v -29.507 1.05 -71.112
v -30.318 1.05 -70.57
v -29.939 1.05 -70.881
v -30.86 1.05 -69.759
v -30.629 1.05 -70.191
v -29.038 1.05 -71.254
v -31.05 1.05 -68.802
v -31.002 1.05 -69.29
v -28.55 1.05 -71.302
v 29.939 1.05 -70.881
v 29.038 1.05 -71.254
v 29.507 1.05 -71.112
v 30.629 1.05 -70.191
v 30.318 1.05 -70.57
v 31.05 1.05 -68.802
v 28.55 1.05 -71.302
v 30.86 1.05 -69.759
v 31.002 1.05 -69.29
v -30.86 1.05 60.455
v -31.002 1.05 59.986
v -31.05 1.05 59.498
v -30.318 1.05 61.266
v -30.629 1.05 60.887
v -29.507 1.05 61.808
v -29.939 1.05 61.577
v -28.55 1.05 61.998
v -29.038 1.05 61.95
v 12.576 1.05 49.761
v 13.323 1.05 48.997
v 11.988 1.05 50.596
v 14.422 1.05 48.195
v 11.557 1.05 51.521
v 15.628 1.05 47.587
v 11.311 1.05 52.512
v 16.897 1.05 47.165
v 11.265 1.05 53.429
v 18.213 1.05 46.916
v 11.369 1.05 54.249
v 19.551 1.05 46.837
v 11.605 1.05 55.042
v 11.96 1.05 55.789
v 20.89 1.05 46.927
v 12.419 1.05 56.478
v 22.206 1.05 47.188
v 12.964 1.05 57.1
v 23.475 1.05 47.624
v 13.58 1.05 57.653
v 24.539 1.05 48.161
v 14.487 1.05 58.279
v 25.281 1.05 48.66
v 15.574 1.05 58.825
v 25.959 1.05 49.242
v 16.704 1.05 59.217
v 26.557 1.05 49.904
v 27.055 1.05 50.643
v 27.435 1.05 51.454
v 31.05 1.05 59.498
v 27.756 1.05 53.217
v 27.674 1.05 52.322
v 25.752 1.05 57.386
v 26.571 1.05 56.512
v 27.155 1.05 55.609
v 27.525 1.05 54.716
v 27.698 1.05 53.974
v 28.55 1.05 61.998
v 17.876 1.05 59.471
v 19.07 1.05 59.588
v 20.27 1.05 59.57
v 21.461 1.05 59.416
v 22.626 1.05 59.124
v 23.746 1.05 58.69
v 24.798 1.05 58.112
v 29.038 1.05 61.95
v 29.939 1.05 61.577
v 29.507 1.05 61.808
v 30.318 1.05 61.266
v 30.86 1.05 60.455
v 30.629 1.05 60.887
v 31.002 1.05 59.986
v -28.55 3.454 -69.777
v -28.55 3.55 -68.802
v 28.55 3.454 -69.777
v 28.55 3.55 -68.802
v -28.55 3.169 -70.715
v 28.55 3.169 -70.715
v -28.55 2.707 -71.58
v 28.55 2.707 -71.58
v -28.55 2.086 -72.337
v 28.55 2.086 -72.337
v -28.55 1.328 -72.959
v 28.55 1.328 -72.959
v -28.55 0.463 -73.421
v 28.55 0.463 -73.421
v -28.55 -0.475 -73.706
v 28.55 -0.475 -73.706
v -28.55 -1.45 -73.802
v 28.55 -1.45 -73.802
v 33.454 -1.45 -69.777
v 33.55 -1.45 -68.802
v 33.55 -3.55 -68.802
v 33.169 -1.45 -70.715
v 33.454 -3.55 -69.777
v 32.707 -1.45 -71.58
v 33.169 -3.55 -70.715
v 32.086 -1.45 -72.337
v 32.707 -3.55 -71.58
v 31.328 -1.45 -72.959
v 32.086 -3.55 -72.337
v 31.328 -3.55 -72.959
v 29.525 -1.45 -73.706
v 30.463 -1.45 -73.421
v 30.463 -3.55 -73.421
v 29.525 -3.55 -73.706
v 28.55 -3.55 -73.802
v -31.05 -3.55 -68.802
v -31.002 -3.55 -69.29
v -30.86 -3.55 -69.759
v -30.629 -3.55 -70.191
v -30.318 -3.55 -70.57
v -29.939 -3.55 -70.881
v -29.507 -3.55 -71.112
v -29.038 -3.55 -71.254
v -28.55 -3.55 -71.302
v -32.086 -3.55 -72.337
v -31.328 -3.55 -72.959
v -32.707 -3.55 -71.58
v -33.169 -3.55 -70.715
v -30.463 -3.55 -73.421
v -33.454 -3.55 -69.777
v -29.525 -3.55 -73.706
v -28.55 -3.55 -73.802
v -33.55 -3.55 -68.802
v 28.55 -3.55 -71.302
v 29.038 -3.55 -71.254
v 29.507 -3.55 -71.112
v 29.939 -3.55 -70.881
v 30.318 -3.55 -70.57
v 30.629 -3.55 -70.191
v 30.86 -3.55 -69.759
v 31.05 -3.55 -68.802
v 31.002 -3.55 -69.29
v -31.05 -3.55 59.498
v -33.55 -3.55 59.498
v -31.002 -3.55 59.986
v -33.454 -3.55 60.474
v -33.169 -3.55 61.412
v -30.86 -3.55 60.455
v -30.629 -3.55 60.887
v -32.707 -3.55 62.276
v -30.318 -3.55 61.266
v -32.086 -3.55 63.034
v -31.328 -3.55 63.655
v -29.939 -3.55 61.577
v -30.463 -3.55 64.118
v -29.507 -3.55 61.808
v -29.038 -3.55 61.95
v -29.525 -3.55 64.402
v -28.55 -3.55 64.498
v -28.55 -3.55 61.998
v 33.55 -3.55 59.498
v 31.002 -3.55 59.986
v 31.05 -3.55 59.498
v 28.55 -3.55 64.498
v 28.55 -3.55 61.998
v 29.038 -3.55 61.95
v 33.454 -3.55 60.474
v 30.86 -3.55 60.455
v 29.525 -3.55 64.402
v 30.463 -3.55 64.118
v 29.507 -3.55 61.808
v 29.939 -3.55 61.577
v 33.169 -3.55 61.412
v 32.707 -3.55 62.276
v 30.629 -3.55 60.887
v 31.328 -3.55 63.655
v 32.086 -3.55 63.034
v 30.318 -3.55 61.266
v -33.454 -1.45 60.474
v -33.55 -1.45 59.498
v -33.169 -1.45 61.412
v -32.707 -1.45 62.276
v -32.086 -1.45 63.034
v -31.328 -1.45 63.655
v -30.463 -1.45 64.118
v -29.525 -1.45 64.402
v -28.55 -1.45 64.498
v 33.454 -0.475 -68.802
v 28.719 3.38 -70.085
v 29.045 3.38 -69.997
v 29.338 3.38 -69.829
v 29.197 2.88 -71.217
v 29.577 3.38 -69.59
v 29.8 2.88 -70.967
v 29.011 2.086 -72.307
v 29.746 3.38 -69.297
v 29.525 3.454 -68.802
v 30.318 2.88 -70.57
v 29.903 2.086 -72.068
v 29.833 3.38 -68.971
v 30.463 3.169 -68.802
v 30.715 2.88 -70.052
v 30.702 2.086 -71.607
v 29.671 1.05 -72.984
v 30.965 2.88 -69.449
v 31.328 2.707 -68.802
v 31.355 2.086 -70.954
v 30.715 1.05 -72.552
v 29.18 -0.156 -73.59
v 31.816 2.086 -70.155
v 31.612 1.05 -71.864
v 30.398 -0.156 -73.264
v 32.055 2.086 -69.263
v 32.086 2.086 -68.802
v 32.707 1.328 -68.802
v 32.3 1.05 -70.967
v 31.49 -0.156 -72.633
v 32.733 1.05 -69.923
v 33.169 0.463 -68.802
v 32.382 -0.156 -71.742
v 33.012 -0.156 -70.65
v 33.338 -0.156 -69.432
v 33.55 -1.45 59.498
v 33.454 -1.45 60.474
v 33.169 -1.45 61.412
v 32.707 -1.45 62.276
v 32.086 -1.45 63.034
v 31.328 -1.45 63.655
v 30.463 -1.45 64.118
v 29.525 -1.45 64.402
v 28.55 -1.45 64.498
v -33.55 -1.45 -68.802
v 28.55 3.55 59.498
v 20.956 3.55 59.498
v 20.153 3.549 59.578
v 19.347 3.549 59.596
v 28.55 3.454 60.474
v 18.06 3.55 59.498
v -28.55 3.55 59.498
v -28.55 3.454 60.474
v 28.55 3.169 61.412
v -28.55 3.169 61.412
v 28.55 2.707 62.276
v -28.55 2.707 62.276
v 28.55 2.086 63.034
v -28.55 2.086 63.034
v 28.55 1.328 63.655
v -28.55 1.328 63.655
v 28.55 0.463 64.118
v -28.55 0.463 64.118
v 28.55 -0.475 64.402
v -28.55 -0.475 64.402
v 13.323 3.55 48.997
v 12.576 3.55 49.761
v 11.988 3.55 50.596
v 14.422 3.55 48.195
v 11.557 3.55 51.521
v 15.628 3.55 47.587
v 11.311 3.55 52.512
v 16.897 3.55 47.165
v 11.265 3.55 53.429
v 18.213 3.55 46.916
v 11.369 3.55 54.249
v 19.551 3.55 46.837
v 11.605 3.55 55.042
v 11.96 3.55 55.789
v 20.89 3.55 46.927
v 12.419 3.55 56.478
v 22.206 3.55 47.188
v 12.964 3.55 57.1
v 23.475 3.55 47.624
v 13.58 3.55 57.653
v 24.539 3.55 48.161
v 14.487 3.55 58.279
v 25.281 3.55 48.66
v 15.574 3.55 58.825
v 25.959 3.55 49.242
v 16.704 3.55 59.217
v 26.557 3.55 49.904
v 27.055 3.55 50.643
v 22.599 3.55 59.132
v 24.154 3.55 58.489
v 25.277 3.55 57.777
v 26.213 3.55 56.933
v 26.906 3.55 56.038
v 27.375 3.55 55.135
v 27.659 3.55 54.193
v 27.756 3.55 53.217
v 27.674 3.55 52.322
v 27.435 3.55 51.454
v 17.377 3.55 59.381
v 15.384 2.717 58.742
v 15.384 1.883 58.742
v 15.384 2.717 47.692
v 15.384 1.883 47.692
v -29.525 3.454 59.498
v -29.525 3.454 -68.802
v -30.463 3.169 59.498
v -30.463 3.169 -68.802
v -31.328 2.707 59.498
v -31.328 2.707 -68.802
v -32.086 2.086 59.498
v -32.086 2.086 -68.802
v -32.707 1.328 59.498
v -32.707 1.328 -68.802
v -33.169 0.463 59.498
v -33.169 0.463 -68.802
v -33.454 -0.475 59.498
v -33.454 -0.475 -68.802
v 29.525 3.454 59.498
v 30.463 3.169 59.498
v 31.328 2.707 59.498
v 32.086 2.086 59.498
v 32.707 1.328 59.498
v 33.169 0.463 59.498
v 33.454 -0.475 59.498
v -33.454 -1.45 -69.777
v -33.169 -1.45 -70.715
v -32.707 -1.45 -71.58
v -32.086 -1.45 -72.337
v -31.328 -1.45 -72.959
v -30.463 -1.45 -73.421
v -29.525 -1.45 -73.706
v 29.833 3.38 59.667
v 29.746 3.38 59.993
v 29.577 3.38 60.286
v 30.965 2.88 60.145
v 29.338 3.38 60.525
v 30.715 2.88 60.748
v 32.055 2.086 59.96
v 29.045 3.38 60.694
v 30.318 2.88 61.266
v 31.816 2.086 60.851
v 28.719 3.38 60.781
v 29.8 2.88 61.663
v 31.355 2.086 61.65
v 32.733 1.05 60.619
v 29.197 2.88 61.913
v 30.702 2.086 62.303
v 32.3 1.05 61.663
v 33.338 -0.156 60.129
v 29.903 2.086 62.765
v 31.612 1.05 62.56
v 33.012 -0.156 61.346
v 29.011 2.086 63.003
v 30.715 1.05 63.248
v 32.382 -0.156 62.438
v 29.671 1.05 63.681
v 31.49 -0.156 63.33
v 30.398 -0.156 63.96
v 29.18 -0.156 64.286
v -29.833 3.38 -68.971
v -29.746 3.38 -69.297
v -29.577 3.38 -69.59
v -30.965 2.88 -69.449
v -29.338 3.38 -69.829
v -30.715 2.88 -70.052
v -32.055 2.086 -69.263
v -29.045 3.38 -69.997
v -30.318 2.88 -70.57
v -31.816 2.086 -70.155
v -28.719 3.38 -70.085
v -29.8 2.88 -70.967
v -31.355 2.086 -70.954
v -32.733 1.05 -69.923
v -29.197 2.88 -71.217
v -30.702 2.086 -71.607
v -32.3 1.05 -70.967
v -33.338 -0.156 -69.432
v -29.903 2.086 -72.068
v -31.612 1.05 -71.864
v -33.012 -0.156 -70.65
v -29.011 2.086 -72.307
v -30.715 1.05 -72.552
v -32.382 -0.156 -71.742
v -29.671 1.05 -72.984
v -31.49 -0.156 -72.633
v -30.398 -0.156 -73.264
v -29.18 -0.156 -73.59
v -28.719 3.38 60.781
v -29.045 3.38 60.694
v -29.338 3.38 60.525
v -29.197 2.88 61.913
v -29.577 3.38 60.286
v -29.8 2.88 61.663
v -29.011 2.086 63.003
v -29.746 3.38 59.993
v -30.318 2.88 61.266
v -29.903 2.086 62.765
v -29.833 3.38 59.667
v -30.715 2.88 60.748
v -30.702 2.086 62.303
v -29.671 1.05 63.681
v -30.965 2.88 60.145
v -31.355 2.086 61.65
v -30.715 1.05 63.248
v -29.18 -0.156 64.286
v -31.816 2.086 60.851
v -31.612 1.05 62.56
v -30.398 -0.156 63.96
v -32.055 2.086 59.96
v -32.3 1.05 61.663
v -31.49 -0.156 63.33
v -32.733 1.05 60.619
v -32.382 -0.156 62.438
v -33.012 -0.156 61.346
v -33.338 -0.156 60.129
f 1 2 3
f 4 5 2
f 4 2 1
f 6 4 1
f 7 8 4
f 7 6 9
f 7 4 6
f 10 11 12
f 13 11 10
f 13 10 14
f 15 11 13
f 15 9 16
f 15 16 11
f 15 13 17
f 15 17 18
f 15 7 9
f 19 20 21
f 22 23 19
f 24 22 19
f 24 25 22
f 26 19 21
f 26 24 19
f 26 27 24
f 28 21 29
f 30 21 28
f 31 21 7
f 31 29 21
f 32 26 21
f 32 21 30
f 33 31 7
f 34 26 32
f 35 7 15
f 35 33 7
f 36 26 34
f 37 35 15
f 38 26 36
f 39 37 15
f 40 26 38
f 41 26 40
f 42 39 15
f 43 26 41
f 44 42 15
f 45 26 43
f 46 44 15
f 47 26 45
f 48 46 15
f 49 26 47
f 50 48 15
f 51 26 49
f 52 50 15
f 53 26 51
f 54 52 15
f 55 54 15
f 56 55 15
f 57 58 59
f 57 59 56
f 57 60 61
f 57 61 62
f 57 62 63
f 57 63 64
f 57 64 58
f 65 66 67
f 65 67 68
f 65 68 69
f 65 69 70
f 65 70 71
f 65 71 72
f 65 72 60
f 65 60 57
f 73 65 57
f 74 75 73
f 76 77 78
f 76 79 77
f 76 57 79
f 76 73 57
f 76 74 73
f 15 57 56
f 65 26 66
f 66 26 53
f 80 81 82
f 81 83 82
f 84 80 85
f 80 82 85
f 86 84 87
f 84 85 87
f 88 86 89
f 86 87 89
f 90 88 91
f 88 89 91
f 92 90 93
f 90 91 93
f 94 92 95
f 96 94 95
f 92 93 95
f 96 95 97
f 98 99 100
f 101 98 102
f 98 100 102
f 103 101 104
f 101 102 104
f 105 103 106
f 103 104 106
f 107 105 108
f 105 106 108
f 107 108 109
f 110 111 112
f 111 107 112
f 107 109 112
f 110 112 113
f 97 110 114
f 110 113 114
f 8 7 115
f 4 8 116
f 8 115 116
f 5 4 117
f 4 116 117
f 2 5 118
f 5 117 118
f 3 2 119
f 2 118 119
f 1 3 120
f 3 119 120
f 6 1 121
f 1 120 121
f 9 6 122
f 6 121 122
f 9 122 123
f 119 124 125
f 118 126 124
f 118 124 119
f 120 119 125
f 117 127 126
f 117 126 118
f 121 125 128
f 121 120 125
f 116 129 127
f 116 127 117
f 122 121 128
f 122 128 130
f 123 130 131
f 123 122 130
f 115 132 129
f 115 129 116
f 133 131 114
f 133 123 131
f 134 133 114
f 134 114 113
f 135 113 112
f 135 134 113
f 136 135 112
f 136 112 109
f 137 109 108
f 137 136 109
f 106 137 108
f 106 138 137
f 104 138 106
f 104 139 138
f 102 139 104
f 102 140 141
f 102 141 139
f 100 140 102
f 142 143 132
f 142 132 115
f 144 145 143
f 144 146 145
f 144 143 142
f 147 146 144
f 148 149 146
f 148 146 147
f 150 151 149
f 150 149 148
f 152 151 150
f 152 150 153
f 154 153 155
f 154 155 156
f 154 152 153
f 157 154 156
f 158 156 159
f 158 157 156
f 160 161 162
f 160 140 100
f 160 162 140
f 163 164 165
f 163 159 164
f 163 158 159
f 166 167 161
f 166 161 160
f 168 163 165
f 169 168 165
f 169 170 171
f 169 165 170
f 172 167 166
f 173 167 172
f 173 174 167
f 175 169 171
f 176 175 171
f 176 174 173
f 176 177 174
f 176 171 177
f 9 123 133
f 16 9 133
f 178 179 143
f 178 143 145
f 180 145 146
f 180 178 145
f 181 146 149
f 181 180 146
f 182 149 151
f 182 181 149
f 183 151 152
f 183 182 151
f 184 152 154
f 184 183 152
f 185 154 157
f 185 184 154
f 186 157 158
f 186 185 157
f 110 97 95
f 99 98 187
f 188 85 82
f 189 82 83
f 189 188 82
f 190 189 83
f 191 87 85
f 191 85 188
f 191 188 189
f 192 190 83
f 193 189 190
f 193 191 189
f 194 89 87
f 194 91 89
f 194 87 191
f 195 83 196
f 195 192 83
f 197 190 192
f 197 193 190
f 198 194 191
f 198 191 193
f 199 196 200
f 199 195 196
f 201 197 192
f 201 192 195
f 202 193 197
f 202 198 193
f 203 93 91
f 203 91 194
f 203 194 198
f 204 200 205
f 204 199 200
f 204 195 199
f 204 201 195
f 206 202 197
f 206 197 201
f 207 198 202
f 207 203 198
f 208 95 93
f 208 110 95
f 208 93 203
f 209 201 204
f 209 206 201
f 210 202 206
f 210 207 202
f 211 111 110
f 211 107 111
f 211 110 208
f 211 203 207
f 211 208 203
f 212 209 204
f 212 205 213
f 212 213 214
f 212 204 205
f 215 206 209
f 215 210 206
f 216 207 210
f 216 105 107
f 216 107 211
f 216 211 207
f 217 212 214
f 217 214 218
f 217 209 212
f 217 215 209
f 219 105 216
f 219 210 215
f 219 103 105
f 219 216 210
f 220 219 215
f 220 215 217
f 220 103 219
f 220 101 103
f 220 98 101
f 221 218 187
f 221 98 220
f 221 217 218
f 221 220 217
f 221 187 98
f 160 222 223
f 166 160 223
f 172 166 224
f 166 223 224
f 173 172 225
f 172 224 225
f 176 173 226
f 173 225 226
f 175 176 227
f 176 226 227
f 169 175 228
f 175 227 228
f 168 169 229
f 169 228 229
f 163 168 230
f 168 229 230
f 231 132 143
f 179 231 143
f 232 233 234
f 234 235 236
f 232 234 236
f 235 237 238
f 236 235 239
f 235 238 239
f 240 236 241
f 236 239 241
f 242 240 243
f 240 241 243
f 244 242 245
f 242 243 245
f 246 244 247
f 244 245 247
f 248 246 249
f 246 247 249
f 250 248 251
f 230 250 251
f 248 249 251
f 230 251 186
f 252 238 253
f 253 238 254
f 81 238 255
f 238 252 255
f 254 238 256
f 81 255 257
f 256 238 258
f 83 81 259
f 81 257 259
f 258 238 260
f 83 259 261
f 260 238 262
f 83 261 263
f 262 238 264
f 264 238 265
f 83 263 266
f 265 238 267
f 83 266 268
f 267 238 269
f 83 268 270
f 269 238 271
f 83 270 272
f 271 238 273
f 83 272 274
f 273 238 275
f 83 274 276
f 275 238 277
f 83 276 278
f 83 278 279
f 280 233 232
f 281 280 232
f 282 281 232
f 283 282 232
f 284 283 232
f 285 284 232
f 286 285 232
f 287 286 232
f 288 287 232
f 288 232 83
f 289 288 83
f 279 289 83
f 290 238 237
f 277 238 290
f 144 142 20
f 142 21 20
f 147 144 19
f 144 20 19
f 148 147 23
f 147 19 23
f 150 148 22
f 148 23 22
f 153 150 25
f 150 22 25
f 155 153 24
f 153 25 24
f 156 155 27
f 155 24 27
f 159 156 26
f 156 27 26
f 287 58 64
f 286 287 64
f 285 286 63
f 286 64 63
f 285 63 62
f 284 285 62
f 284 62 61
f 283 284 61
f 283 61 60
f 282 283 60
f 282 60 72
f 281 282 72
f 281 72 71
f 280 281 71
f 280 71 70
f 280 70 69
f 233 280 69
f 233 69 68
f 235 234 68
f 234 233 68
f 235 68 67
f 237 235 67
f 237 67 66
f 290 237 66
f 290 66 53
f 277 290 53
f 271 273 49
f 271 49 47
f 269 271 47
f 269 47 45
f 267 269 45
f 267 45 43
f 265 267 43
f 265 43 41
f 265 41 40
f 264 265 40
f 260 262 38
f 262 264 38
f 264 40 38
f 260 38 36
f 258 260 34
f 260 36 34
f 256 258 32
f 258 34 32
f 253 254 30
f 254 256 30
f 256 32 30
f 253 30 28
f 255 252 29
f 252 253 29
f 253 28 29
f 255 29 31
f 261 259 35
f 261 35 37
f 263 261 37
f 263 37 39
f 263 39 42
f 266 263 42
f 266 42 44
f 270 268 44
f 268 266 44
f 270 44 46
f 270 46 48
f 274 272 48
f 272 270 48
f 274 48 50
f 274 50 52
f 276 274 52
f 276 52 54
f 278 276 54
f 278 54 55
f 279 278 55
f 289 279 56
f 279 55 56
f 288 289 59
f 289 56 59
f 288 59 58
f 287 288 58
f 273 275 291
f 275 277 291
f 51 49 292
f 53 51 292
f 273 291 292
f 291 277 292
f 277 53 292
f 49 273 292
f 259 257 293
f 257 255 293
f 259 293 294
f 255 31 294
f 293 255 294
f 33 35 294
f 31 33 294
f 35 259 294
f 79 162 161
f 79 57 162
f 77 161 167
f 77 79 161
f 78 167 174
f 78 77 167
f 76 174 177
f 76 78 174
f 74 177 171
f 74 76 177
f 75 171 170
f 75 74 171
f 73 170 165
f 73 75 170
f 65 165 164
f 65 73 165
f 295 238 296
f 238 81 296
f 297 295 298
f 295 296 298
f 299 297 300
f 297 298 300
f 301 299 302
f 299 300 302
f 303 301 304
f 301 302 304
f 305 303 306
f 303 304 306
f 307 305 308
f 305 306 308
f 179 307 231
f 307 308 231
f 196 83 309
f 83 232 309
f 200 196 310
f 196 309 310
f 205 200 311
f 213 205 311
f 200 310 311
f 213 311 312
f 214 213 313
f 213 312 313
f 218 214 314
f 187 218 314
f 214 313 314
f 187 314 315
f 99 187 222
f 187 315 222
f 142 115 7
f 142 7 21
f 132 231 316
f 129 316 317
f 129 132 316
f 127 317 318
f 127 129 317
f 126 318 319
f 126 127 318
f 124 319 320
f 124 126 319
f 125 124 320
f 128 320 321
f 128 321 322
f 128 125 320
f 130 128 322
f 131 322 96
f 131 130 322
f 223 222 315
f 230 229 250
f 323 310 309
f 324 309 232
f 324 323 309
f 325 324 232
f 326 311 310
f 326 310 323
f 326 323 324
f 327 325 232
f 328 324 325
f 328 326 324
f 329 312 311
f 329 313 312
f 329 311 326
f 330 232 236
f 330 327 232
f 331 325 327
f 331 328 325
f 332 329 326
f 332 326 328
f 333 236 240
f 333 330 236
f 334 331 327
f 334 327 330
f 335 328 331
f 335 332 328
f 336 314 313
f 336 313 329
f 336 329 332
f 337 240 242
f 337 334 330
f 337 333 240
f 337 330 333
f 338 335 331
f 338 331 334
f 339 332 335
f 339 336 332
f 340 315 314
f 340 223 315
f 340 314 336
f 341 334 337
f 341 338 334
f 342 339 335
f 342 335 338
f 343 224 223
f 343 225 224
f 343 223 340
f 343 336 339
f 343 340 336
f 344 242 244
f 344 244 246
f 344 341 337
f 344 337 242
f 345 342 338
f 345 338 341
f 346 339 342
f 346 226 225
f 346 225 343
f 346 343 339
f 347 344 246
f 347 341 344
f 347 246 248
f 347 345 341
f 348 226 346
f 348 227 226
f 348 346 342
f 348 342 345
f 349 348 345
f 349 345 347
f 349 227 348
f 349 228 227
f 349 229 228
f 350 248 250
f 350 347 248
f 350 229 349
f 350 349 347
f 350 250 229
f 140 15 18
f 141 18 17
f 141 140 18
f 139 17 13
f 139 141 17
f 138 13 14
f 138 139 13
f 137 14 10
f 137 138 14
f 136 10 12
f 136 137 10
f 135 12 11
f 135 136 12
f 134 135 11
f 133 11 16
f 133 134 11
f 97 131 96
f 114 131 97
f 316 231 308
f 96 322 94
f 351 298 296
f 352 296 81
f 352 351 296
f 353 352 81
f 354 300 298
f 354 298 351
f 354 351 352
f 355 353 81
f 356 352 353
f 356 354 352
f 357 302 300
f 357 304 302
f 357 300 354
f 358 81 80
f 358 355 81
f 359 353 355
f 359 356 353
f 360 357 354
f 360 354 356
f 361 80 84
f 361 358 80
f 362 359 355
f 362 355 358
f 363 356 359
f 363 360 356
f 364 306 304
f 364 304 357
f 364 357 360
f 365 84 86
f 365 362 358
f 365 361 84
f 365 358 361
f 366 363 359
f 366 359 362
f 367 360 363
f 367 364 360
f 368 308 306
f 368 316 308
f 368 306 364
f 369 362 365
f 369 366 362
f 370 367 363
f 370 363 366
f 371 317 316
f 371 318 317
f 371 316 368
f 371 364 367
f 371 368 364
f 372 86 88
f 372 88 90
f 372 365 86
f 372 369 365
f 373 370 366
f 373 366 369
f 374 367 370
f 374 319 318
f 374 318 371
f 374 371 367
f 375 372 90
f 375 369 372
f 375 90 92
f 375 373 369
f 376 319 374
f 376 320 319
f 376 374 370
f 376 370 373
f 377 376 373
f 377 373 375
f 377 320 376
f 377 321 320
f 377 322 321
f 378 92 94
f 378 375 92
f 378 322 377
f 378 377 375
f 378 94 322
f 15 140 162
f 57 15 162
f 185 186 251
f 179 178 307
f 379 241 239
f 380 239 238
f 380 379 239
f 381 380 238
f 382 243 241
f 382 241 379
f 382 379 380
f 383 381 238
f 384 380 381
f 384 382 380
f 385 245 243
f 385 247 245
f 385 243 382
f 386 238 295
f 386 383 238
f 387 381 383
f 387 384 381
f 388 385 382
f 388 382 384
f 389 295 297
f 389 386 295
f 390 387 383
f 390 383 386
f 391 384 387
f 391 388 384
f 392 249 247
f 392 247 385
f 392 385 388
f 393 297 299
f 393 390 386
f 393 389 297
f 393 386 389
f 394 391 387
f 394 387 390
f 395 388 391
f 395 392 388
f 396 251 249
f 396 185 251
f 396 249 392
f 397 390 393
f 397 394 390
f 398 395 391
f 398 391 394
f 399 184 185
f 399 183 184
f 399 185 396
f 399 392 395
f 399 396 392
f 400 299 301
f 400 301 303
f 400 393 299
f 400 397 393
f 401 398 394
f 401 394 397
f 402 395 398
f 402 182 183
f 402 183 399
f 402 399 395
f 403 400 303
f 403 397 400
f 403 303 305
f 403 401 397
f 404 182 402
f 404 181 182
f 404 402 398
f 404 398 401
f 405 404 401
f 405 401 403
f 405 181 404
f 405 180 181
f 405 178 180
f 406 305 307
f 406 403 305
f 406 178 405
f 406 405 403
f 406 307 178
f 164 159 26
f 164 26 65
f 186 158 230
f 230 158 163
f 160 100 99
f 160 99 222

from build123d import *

# Parameters (mm, degrees)
F0_W     = 67.1
F0_H     = 138.3
F1_DEPTH = 3.55
F2_R     = 5
F3_T     = -2.5
F4_R     = 5
F6_DEPTH = 25


with BuildPart() as f1:
    # F0 (on Front) → F1 (new body, symmetric)
    with BuildSketch(Plane.XZ):
        with Locations((0, -4.651891)):
            Rectangle(F0_W, F0_H)
    extrude(amount=F1_DEPTH, both=True)

    # F2
    f2_edges = [f1.edges().sort_by_distance(p)[0] for p in [
        (-33.55, 0, 64.498109),
        (33.55, 0, 64.498109),
        (33.55, 0, -73.801891),
        (-33.55, 0, -73.801891),
    ]]
    fillet(f2_edges, radius=F2_R)

    # F3
    f3_openings = [f1.faces().sort_by_distance(p)[0] for p in [
        (0, -3.55, -4.651891),
    ]]
    offset(amount=F3_T, openings=f3_openings)

    # F4
    f4_edges = [f1.edges().sort_by_distance(p)[0] for p in [
        (33.55, 3.55, -4.651891),
        (32.085534, 3.55, -72.337424),
        (32.085534, 3.55, 63.033643),
        (0, 3.55, -73.801891),
        (0, 3.55, 64.498109),
        (-32.085534, 3.55, -72.337424),
        (-32.085534, 3.55, 63.033643),
        (-33.55, 3.55, -4.651891),
    ]]
    fillet(f4_edges, radius=F4_R)

    # F5 (on Front) → F6 (cut)
    with BuildSketch(Plane.XZ):
        with BuildLine():
            add(Edge.make_bspline(
                [(27.755955, 53.217217), (27.755955, 64.267715), (15.384319, 58.742466), (3.012683, 53.217217), (15.384319, 47.691968), (27.755955, 42.166719), (27.755955, 53.217217)],
                knots=[0, 0, 0, 2.094395, 2.094395, 4.18879, 4.18879, 6.283185, 6.283185, 6.283185], degree=2, weights=[1, 0.5, 1, 0.5, 1, 0.5, 1]))
        make_face()
    extrude(amount=-F6_DEPTH, mode=Mode.SUBTRACT)


solid = f1.part
